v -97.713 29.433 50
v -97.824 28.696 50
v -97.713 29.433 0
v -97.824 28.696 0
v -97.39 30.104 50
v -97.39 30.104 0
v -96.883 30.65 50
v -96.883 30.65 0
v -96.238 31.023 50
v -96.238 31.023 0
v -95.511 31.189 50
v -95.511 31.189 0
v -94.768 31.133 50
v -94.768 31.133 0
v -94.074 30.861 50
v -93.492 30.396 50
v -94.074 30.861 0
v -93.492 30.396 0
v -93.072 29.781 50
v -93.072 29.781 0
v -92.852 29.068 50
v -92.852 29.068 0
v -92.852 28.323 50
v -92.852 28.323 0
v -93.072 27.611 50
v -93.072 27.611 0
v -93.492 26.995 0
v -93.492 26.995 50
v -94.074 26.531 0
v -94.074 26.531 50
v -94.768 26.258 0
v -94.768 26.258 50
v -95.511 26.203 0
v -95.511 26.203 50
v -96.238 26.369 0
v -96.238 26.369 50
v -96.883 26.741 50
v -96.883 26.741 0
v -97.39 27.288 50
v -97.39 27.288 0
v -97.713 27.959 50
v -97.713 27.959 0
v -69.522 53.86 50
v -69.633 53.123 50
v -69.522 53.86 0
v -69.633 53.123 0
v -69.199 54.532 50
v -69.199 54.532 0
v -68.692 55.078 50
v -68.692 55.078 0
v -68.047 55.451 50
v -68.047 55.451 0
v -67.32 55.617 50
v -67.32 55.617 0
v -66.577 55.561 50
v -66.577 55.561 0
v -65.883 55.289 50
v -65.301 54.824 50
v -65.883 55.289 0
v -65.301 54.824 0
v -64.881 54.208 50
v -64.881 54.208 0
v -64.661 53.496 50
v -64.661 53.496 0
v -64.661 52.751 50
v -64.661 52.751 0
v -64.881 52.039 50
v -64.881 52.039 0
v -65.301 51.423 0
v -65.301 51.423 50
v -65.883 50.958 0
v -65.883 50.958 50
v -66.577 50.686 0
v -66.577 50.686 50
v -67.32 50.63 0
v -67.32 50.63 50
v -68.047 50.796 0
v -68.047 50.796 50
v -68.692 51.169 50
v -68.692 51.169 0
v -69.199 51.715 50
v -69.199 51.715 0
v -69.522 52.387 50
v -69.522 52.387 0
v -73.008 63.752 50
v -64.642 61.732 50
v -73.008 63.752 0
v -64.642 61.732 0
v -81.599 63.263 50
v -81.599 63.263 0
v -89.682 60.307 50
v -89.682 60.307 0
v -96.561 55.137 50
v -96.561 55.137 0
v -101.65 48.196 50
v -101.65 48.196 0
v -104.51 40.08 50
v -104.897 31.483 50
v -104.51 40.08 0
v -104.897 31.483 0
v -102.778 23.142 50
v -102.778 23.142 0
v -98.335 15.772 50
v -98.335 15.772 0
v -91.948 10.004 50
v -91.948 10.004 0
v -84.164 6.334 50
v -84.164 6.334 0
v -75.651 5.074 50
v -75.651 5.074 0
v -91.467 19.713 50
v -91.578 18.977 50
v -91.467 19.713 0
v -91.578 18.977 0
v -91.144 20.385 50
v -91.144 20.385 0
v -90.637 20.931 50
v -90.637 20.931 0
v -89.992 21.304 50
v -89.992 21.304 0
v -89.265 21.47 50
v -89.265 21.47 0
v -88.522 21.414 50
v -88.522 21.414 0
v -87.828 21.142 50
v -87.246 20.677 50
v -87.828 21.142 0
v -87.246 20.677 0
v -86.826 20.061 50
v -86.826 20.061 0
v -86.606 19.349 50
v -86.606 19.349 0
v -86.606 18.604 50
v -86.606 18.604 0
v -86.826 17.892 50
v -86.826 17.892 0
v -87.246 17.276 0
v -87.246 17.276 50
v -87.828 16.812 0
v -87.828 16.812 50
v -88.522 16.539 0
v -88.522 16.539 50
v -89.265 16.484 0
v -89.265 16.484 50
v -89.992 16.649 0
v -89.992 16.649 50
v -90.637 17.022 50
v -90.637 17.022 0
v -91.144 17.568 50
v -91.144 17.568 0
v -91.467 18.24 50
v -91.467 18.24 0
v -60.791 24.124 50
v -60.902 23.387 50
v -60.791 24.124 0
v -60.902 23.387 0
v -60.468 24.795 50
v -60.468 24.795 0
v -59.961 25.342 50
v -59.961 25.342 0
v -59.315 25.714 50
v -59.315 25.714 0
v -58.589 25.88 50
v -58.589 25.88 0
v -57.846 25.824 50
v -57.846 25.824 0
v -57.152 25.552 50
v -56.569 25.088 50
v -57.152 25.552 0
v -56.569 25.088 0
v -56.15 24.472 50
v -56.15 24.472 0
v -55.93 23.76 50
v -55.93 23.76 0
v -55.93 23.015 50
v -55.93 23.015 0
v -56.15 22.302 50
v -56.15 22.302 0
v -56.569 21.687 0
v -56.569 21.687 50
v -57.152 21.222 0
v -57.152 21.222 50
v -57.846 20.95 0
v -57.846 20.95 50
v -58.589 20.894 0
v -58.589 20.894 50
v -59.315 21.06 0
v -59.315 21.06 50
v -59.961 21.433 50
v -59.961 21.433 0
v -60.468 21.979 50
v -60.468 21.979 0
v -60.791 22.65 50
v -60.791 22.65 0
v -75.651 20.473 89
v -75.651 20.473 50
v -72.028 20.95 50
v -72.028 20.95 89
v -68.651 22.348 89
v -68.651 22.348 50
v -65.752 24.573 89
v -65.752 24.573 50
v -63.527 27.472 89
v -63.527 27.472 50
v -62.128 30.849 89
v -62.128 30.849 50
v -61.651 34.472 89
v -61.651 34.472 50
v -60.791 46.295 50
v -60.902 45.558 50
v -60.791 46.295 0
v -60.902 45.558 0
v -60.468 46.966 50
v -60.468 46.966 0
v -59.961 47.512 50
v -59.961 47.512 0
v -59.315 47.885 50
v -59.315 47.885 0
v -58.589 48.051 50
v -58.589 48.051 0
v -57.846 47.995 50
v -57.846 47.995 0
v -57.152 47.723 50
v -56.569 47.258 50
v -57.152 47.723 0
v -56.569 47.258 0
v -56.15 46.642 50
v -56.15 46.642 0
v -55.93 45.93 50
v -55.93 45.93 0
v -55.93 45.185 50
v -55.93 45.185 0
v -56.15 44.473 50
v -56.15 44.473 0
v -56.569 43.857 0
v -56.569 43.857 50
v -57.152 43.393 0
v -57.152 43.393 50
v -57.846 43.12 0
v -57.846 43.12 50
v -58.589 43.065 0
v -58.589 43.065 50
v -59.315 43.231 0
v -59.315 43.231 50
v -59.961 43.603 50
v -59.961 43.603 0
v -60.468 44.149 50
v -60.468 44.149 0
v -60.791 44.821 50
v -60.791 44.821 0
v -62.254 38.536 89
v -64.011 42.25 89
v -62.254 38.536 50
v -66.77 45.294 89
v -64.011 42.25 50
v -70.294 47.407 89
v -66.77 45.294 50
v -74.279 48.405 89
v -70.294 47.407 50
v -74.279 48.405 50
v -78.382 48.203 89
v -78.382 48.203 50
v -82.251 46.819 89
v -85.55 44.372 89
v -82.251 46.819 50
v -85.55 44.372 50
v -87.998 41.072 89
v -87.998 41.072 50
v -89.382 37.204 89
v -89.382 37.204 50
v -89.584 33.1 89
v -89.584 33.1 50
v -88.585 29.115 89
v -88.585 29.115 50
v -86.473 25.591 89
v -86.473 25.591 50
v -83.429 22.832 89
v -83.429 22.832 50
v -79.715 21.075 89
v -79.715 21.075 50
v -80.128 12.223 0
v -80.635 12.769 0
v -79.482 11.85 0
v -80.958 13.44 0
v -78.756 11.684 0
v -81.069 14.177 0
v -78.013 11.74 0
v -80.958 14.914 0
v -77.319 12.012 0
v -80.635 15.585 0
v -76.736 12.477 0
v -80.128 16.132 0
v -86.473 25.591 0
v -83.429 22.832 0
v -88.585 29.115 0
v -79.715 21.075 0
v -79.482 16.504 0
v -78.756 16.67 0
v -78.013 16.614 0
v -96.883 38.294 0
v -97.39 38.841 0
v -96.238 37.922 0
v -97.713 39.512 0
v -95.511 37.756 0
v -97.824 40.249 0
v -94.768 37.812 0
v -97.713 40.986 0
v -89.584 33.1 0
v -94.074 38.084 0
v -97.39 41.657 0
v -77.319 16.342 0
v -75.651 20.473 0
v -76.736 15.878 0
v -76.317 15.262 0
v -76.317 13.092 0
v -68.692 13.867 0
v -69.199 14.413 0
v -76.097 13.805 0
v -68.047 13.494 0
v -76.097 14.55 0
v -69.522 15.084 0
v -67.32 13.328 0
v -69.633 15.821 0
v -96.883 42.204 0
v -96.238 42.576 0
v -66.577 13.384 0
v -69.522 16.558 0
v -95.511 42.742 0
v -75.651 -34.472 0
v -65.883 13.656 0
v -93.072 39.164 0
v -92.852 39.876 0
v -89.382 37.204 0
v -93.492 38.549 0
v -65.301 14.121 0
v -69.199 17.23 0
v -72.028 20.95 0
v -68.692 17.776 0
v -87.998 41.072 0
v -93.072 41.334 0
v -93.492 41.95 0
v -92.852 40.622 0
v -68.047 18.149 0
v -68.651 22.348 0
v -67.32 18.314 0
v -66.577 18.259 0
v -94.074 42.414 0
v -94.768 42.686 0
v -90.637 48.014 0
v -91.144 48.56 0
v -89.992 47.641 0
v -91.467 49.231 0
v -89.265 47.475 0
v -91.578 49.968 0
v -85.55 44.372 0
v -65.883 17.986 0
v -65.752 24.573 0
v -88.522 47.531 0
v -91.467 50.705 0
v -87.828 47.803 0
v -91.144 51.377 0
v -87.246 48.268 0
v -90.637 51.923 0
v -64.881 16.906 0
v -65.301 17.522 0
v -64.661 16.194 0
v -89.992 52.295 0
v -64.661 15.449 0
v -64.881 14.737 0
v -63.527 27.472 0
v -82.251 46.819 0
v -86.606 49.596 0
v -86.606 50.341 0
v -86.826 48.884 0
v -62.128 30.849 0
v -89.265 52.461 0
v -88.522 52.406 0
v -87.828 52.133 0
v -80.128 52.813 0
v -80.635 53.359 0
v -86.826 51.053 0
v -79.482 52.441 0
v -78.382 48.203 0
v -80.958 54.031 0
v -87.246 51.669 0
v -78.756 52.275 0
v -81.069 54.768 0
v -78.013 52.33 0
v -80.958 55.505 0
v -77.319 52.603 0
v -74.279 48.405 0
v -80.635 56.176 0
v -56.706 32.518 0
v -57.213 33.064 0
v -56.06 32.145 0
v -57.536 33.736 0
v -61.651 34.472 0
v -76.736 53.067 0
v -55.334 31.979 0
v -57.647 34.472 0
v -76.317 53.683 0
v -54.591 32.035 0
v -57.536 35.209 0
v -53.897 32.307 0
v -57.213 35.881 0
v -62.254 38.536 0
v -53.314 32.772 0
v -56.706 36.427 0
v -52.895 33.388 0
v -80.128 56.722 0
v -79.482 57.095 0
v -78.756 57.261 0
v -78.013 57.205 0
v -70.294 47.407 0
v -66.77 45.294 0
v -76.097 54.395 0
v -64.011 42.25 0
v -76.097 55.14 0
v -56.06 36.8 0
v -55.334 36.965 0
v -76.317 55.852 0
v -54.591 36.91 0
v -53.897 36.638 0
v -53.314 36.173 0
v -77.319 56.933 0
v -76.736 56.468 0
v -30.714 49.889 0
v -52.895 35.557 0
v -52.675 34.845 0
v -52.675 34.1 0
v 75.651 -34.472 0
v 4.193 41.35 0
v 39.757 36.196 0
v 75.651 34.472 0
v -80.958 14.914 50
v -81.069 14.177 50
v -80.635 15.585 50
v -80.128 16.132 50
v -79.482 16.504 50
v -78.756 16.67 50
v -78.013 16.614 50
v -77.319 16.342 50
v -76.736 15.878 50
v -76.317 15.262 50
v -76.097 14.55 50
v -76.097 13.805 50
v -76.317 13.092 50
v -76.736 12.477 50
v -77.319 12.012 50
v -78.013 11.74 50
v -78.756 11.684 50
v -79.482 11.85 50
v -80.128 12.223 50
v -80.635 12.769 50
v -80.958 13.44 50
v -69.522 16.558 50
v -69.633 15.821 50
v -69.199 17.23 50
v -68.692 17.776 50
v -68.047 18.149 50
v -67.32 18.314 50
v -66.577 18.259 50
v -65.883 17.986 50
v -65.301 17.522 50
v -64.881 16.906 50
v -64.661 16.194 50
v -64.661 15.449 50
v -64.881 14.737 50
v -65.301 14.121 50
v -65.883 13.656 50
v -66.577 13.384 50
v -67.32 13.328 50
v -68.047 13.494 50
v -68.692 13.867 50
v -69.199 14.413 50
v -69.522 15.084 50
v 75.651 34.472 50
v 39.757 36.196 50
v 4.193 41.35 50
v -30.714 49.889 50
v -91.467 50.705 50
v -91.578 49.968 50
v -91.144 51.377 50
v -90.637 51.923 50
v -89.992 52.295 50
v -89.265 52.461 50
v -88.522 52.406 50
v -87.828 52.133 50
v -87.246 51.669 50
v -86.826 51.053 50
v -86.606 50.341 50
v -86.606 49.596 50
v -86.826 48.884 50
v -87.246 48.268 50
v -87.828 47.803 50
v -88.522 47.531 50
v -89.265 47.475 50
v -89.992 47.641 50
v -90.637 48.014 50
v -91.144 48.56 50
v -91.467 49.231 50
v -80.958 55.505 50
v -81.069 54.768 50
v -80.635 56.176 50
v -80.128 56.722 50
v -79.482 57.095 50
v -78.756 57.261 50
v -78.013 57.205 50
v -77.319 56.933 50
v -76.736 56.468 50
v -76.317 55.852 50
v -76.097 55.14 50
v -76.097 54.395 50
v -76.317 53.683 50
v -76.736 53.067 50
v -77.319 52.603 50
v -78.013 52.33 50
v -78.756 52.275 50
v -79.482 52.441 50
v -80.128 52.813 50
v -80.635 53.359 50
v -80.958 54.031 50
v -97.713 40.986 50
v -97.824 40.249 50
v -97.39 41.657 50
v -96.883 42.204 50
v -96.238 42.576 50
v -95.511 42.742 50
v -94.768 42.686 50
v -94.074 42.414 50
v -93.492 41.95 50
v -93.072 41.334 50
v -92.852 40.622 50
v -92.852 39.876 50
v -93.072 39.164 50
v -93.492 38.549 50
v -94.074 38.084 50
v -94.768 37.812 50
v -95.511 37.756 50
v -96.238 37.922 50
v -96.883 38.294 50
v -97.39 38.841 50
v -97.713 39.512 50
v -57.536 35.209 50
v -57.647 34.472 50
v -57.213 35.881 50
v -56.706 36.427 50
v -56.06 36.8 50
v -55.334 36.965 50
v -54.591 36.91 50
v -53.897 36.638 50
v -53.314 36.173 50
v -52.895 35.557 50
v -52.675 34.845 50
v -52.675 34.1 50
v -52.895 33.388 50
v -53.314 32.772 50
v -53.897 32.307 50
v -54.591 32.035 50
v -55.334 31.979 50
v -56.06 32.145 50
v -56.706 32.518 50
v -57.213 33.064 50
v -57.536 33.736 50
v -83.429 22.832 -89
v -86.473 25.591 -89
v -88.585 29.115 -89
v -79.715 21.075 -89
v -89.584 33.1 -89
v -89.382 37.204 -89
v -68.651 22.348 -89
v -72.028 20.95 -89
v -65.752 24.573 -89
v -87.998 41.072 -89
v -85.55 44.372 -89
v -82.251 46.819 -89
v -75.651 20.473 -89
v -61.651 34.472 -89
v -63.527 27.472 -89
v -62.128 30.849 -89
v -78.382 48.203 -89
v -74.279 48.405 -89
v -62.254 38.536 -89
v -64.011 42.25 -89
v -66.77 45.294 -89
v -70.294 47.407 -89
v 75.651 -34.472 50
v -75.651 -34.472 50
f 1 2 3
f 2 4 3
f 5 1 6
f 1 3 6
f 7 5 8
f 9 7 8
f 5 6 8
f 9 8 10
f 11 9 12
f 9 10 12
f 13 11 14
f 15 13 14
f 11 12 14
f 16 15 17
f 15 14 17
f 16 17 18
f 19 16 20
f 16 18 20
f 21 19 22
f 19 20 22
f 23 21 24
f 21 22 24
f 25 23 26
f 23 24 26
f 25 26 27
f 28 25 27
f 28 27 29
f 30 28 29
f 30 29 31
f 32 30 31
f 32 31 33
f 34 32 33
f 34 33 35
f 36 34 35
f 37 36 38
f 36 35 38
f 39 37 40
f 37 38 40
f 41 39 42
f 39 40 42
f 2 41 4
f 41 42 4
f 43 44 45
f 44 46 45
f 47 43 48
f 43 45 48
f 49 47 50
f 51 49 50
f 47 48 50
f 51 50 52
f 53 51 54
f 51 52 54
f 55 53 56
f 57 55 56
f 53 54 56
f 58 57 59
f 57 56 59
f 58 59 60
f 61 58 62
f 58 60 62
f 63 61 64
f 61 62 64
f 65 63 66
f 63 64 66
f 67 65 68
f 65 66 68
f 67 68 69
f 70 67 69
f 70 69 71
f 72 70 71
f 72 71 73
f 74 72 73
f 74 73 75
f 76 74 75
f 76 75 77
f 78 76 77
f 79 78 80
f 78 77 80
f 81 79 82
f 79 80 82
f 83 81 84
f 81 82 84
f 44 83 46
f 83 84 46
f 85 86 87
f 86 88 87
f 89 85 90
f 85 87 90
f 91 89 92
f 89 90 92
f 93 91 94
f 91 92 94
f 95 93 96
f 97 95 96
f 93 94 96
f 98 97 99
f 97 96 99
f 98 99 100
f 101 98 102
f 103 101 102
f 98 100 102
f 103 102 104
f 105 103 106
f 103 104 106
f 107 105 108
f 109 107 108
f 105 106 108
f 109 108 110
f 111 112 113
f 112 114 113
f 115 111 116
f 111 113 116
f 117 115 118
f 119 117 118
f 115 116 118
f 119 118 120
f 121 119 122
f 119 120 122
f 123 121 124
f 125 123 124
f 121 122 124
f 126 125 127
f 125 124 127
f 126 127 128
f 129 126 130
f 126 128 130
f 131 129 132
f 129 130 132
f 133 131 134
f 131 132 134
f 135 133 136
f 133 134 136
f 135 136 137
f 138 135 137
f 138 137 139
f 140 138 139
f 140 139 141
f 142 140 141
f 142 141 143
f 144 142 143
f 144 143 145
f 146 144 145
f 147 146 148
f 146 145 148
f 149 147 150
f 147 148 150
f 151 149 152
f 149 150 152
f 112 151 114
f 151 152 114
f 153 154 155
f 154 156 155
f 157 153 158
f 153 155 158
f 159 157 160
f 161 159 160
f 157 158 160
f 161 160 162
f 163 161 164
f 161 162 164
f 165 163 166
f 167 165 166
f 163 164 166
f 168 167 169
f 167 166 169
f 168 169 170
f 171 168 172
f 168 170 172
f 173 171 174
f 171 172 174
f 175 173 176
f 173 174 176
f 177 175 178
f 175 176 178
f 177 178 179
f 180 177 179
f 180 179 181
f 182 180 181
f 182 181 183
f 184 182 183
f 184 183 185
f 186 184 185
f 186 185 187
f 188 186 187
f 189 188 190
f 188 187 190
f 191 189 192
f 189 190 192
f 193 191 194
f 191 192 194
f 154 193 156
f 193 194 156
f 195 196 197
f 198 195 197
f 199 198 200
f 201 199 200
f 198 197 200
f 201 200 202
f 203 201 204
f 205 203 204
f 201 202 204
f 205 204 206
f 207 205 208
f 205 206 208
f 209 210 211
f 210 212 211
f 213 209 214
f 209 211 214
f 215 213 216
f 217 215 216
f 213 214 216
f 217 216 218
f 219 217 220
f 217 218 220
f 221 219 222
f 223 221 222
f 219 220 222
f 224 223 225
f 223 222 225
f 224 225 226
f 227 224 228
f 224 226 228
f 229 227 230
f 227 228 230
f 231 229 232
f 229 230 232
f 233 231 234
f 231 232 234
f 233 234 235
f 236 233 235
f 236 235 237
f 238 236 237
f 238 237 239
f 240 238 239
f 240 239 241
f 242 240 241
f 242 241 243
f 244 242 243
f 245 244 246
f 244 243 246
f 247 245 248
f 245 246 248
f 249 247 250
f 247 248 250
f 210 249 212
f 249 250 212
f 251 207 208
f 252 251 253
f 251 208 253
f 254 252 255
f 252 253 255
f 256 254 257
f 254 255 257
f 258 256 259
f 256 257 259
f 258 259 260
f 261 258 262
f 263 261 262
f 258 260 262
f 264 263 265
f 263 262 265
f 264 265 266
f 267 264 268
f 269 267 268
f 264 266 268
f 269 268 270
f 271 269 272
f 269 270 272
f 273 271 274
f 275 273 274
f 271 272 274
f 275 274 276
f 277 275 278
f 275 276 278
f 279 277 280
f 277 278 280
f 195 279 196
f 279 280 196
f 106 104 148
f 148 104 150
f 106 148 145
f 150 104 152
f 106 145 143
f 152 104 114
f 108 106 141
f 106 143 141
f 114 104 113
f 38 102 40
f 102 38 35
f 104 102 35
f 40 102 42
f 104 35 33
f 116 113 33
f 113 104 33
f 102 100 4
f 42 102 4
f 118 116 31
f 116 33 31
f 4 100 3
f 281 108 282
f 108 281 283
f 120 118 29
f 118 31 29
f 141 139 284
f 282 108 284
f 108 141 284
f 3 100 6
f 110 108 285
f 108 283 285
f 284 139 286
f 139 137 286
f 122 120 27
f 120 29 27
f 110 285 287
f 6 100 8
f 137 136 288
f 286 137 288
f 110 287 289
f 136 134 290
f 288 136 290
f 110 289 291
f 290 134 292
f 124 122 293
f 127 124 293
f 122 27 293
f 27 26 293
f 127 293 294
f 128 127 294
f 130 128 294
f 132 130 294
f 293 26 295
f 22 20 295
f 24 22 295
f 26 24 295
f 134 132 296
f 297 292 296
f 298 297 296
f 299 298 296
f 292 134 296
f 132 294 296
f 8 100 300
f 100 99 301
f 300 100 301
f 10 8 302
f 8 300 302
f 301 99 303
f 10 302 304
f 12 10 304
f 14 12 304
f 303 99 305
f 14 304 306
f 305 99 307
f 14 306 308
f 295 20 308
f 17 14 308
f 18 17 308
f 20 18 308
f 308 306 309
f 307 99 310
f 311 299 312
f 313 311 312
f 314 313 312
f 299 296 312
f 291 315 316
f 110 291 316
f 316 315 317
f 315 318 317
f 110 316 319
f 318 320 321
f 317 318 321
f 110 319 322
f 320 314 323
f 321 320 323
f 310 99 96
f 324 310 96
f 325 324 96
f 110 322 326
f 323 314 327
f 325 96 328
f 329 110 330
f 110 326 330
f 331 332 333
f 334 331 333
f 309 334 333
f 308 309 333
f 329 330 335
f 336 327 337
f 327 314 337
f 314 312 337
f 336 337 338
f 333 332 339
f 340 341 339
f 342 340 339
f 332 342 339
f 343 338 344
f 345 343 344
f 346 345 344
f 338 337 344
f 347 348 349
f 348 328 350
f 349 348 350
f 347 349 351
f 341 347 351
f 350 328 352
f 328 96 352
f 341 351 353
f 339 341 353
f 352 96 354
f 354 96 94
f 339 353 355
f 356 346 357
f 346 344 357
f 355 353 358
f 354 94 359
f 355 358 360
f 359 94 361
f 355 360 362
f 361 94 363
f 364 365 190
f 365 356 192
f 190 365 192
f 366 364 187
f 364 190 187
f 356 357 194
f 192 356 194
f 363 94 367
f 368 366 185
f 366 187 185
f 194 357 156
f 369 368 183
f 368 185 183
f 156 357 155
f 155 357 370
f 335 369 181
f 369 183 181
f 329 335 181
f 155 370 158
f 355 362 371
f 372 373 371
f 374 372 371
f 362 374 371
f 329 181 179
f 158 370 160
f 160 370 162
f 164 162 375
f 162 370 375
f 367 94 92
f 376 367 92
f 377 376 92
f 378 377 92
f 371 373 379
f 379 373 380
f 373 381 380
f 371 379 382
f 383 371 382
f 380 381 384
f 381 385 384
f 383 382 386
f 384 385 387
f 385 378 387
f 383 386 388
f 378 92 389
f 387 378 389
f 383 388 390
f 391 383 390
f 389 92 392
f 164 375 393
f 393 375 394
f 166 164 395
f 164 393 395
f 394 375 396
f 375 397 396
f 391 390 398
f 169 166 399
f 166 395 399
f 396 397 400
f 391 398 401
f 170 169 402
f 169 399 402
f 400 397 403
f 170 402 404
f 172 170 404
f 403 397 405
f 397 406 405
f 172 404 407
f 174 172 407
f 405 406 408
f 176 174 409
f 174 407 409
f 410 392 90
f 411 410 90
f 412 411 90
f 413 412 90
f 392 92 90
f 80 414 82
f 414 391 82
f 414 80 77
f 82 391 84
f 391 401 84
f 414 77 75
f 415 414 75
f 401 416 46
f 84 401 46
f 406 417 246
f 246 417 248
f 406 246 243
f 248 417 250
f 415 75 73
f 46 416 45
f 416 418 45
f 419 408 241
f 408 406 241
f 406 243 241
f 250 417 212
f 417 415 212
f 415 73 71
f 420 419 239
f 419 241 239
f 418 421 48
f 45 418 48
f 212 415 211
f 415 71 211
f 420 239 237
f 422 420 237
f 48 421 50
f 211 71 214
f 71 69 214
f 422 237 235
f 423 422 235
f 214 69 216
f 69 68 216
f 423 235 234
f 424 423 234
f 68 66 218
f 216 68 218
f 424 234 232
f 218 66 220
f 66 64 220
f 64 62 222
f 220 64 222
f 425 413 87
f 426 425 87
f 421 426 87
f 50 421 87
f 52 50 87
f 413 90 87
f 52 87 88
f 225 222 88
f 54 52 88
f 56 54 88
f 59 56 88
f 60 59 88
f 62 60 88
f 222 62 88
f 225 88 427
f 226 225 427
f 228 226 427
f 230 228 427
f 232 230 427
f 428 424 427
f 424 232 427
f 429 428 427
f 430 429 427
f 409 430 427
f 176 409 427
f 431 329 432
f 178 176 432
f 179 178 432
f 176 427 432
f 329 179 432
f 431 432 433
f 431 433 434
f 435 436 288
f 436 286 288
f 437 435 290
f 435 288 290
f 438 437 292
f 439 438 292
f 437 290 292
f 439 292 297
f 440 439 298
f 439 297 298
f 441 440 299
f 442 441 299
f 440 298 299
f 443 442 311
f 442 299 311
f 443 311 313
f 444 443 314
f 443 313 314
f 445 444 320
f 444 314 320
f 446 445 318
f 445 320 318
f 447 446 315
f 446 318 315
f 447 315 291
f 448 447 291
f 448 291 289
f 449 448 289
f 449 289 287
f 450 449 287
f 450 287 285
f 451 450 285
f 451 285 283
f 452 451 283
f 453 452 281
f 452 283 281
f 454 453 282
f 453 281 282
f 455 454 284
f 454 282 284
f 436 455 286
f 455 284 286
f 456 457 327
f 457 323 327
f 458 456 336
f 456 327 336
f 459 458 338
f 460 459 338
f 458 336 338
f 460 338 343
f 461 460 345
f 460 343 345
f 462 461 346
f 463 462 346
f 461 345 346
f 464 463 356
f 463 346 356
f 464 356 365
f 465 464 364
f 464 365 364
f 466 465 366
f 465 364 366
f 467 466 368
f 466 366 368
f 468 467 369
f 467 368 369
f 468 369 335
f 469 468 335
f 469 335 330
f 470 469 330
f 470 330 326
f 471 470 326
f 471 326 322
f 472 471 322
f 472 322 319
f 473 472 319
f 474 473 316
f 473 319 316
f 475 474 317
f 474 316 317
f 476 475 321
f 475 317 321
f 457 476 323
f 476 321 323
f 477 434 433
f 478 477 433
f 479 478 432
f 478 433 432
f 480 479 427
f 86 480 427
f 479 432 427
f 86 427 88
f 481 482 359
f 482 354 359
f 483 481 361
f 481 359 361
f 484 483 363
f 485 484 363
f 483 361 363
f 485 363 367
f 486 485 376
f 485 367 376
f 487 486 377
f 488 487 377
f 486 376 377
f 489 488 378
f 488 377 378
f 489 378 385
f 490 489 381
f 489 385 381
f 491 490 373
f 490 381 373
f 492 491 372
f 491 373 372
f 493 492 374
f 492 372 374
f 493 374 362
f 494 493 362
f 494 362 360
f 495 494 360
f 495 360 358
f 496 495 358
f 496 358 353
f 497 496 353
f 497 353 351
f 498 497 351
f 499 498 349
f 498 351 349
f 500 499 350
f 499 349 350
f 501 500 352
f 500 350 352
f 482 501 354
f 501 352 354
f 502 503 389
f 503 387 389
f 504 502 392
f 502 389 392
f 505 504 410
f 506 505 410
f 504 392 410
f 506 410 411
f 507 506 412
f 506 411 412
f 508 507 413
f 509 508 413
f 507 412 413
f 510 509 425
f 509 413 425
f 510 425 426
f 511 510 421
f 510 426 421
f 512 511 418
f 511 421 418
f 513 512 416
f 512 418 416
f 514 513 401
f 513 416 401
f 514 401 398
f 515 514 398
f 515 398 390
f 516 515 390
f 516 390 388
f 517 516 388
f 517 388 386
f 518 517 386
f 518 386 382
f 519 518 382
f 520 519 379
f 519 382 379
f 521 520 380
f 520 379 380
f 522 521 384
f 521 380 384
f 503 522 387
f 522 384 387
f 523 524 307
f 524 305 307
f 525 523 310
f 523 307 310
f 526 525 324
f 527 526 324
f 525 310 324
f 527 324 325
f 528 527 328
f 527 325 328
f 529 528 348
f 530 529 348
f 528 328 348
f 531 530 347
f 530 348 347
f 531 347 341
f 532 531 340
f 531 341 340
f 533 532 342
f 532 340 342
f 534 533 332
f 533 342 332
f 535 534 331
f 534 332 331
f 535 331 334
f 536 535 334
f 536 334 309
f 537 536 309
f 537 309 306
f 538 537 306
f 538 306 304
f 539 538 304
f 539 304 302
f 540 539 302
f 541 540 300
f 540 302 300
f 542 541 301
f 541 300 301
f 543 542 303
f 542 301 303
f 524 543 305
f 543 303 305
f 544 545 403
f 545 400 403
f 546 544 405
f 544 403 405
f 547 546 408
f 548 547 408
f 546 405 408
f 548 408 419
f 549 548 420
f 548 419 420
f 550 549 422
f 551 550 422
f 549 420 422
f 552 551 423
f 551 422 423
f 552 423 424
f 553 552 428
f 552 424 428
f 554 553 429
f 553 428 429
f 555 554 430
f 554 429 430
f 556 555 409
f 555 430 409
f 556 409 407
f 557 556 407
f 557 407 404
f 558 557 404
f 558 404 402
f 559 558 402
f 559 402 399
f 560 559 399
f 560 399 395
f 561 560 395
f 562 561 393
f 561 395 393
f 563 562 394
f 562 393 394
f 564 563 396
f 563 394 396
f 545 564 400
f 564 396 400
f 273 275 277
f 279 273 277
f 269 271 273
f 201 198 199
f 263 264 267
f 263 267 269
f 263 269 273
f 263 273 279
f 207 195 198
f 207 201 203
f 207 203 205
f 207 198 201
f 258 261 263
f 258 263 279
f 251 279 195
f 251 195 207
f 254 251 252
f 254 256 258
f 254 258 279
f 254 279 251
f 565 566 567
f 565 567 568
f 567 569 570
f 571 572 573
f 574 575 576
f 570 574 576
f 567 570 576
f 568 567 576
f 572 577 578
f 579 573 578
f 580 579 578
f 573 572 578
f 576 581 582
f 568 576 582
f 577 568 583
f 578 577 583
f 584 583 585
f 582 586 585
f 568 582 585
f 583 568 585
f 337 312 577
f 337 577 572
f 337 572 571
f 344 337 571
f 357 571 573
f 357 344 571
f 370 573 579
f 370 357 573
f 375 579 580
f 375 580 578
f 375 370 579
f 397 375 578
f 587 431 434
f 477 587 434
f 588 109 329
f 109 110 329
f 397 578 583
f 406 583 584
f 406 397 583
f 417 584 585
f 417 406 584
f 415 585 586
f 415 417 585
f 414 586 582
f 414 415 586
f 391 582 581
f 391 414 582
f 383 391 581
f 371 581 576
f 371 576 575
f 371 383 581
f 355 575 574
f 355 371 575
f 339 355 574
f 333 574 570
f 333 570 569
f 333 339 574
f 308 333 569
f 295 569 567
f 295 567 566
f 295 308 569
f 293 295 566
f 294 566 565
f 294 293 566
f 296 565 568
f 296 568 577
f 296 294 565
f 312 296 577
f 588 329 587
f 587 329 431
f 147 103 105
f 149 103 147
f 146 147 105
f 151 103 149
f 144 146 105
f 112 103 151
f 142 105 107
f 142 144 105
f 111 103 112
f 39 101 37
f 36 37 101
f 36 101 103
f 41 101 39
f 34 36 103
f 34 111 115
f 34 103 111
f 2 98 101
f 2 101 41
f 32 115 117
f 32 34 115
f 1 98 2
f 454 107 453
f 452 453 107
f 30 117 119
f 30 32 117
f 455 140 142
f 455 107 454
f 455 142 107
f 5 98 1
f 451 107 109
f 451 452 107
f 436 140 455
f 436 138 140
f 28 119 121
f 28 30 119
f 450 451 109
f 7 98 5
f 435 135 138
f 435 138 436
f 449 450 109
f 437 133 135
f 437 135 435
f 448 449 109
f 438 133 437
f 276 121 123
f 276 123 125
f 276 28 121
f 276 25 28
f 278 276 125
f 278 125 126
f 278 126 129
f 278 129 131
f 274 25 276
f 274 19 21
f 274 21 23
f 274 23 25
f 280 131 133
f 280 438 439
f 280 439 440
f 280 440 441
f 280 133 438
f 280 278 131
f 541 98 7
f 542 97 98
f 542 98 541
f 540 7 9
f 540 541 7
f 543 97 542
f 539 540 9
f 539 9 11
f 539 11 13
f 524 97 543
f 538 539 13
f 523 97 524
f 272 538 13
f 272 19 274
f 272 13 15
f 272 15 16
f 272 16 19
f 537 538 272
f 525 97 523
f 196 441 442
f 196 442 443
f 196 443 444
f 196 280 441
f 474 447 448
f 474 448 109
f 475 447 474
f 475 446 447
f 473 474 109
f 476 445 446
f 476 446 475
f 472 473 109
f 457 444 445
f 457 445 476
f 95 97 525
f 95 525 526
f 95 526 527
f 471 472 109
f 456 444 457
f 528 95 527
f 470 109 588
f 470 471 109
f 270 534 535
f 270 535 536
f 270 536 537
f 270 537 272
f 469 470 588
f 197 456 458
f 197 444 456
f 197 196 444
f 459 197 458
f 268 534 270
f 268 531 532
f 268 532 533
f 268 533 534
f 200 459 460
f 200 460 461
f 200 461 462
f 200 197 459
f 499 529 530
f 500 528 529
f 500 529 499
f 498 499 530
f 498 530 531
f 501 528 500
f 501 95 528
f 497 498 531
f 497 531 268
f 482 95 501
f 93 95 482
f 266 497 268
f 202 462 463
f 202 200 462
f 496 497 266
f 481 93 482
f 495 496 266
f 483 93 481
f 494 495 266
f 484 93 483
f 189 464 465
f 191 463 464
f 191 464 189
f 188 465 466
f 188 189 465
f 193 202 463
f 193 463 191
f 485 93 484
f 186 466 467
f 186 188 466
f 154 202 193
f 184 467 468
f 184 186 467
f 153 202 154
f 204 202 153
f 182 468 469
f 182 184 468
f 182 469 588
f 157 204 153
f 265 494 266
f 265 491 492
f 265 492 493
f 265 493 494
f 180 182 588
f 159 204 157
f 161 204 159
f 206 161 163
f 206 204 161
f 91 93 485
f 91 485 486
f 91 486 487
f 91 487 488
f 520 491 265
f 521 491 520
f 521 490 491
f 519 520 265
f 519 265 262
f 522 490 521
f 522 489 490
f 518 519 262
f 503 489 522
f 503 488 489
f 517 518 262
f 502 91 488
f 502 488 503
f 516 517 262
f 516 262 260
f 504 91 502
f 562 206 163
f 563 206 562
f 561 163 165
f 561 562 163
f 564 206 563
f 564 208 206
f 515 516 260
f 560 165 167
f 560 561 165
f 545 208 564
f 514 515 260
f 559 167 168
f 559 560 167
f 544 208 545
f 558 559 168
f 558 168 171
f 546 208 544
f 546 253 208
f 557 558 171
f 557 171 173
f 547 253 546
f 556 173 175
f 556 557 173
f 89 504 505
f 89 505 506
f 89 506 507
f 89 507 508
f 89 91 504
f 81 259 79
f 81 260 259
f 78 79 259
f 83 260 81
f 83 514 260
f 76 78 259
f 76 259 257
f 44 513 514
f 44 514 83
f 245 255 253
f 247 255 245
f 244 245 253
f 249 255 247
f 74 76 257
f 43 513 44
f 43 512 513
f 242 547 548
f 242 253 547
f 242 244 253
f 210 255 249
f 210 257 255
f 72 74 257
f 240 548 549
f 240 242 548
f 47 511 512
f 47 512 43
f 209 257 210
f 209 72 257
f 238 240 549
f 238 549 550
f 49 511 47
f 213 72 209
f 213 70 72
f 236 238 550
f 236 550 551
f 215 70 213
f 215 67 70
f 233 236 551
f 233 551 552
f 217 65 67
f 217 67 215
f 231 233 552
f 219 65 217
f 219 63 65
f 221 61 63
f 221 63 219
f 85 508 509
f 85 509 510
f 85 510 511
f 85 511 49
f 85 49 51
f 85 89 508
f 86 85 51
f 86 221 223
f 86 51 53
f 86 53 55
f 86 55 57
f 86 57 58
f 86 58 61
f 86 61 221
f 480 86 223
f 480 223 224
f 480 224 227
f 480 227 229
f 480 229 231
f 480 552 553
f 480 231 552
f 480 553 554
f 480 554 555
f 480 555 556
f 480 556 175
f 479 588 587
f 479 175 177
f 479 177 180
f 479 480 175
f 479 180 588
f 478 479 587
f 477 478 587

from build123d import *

# Parameters (mm, degrees)
F1_DEPTH = 25
F2_DEPTH = 89
F4_D     = 5
F5_DEPTH = 25


with BuildPart() as f1:
    # F0 (on Top) → F1 (new body)
    with BuildSketch(Plane.XY):
        with BuildLine():
            ThreePointArc((-64.6422651169, 61.7318101091), (-104.509721445, 40.0797605591), (-75.6510277108, 5.0740307461))
            Line((-75.6510277108, 5.0740307461), (-75.6510277108, 20.4725478984))
            ThreePointArc((-75.6510277108, 20.4725478984), (-85.5504441422, 44.3718533068), (-61.6511387339, 34.4724368753))
            Line((-61.6511387339, 34.4724368753), (-46.2526215815, 34.4724368753))
            ThreePointArc((-46.2526215815, 34.4724368753), (-51.279873074, 50.91363831), (-64.6422651169, 61.7318101091))
        make_face()
        with BuildLine():
            Line((-46.2526215815, 34.4724368753), (75.6510277108, 34.4724368753))
            ThreePointArc((75.6510277108, 34.4724368753), (4.192505753, 41.3504150705), (-64.6422651169, 61.7318101091))
            ThreePointArc((-64.6422651169, 61.7318101091), (-51.279873074, 50.91363831), (-46.2526215815, 34.4724368753))
        make_face()
        with BuildLine():
            Line((-75.6510277108, 20.4725478984), (-75.6510277108, 5.0740307461))
            ThreePointArc((-75.6510277108, 5.0740307461), (-54.8632153807, 13.6846245453), (-46.2526215815, 34.4724368753))
            Line((-46.2526215815, 34.4724368753), (-61.6511387339, 34.4724368753))
            ThreePointArc((-61.6511387339, 34.4724368753), (-65.7516112793, 24.5730204439), (-75.6510277108, 20.4725478984))
        make_face()
        with BuildLine():
            Line((-75.6510277108, -34.4724368753), (75.6510277108, -34.4724368753))
            Line((75.6510277108, -34.4724368753), (75.6510277108, 34.4724368753))
            Line((75.6510277108, 34.4724368753), (-46.2526215815, 34.4724368753))
            ThreePointArc((-46.2526215815, 34.4724368753), (-54.8632153807, 13.6846245453), (-75.6510277108, 5.0740307461))
            Line((-75.6510277108, 5.0740307461), (-75.6510277108, -34.4724368753))
        make_face()
    extrude(amount=F1_DEPTH)

    # F0 (on Top) → F2 (join, symmetric)
    with BuildSketch(Plane.XY):
        with BuildLine():
            ThreePointArc((-61.6511387339, 34.4724368753), (-85.5504441422, 44.3718533068), (-75.6510277108, 20.4725478984))
            Line((-75.6510277108, 20.4725478984), (-75.6510277108, 34.4724368753))
            Line((-75.6510277108, 34.4724368753), (-61.6511387339, 34.4724368753))
        make_face()
        with BuildLine():
            Line((-75.6510277108, 34.4724368753), (-75.6510277108, 20.4725478984))
            ThreePointArc((-75.6510277108, 20.4725478984), (-65.7516112793, 24.5730204439), (-61.6511387339, 34.4724368753))
            Line((-61.6511387339, 34.4724368753), (-75.6510277108, 34.4724368753))
        make_face()
    extrude(amount=F2_DEPTH, both=True)

    # F4 (through all)
    with Locations(Plane.XY.offset(25)):
        with Locations((-78.5690456042, 54.7676971151), (-67.133374486, 53.123495831), (-58.4019980838, 45.5577151106), (-55.1470667124, 34.4724368753), (-58.4019980838, 23.3871586401), (-67.133374486, 15.8213779197), (-78.5690456042, 14.1771766356), (-89.078266659, 18.9765770782), (-95.32443422, 28.6958035179), (-95.32443422, 40.2490702328), (-89.078266659, 49.9682966725)):
            Hole(F4_D / 2)

    # F5 (add): a face of the model
    f5_faces = [f1.faces().sort_by_distance(p)[0] for p in [
        (-9.2870203621, 6.9469719562, 25),
    ]]
    extrude(f5_faces, amount=F5_DEPTH)


solid = f1.part
